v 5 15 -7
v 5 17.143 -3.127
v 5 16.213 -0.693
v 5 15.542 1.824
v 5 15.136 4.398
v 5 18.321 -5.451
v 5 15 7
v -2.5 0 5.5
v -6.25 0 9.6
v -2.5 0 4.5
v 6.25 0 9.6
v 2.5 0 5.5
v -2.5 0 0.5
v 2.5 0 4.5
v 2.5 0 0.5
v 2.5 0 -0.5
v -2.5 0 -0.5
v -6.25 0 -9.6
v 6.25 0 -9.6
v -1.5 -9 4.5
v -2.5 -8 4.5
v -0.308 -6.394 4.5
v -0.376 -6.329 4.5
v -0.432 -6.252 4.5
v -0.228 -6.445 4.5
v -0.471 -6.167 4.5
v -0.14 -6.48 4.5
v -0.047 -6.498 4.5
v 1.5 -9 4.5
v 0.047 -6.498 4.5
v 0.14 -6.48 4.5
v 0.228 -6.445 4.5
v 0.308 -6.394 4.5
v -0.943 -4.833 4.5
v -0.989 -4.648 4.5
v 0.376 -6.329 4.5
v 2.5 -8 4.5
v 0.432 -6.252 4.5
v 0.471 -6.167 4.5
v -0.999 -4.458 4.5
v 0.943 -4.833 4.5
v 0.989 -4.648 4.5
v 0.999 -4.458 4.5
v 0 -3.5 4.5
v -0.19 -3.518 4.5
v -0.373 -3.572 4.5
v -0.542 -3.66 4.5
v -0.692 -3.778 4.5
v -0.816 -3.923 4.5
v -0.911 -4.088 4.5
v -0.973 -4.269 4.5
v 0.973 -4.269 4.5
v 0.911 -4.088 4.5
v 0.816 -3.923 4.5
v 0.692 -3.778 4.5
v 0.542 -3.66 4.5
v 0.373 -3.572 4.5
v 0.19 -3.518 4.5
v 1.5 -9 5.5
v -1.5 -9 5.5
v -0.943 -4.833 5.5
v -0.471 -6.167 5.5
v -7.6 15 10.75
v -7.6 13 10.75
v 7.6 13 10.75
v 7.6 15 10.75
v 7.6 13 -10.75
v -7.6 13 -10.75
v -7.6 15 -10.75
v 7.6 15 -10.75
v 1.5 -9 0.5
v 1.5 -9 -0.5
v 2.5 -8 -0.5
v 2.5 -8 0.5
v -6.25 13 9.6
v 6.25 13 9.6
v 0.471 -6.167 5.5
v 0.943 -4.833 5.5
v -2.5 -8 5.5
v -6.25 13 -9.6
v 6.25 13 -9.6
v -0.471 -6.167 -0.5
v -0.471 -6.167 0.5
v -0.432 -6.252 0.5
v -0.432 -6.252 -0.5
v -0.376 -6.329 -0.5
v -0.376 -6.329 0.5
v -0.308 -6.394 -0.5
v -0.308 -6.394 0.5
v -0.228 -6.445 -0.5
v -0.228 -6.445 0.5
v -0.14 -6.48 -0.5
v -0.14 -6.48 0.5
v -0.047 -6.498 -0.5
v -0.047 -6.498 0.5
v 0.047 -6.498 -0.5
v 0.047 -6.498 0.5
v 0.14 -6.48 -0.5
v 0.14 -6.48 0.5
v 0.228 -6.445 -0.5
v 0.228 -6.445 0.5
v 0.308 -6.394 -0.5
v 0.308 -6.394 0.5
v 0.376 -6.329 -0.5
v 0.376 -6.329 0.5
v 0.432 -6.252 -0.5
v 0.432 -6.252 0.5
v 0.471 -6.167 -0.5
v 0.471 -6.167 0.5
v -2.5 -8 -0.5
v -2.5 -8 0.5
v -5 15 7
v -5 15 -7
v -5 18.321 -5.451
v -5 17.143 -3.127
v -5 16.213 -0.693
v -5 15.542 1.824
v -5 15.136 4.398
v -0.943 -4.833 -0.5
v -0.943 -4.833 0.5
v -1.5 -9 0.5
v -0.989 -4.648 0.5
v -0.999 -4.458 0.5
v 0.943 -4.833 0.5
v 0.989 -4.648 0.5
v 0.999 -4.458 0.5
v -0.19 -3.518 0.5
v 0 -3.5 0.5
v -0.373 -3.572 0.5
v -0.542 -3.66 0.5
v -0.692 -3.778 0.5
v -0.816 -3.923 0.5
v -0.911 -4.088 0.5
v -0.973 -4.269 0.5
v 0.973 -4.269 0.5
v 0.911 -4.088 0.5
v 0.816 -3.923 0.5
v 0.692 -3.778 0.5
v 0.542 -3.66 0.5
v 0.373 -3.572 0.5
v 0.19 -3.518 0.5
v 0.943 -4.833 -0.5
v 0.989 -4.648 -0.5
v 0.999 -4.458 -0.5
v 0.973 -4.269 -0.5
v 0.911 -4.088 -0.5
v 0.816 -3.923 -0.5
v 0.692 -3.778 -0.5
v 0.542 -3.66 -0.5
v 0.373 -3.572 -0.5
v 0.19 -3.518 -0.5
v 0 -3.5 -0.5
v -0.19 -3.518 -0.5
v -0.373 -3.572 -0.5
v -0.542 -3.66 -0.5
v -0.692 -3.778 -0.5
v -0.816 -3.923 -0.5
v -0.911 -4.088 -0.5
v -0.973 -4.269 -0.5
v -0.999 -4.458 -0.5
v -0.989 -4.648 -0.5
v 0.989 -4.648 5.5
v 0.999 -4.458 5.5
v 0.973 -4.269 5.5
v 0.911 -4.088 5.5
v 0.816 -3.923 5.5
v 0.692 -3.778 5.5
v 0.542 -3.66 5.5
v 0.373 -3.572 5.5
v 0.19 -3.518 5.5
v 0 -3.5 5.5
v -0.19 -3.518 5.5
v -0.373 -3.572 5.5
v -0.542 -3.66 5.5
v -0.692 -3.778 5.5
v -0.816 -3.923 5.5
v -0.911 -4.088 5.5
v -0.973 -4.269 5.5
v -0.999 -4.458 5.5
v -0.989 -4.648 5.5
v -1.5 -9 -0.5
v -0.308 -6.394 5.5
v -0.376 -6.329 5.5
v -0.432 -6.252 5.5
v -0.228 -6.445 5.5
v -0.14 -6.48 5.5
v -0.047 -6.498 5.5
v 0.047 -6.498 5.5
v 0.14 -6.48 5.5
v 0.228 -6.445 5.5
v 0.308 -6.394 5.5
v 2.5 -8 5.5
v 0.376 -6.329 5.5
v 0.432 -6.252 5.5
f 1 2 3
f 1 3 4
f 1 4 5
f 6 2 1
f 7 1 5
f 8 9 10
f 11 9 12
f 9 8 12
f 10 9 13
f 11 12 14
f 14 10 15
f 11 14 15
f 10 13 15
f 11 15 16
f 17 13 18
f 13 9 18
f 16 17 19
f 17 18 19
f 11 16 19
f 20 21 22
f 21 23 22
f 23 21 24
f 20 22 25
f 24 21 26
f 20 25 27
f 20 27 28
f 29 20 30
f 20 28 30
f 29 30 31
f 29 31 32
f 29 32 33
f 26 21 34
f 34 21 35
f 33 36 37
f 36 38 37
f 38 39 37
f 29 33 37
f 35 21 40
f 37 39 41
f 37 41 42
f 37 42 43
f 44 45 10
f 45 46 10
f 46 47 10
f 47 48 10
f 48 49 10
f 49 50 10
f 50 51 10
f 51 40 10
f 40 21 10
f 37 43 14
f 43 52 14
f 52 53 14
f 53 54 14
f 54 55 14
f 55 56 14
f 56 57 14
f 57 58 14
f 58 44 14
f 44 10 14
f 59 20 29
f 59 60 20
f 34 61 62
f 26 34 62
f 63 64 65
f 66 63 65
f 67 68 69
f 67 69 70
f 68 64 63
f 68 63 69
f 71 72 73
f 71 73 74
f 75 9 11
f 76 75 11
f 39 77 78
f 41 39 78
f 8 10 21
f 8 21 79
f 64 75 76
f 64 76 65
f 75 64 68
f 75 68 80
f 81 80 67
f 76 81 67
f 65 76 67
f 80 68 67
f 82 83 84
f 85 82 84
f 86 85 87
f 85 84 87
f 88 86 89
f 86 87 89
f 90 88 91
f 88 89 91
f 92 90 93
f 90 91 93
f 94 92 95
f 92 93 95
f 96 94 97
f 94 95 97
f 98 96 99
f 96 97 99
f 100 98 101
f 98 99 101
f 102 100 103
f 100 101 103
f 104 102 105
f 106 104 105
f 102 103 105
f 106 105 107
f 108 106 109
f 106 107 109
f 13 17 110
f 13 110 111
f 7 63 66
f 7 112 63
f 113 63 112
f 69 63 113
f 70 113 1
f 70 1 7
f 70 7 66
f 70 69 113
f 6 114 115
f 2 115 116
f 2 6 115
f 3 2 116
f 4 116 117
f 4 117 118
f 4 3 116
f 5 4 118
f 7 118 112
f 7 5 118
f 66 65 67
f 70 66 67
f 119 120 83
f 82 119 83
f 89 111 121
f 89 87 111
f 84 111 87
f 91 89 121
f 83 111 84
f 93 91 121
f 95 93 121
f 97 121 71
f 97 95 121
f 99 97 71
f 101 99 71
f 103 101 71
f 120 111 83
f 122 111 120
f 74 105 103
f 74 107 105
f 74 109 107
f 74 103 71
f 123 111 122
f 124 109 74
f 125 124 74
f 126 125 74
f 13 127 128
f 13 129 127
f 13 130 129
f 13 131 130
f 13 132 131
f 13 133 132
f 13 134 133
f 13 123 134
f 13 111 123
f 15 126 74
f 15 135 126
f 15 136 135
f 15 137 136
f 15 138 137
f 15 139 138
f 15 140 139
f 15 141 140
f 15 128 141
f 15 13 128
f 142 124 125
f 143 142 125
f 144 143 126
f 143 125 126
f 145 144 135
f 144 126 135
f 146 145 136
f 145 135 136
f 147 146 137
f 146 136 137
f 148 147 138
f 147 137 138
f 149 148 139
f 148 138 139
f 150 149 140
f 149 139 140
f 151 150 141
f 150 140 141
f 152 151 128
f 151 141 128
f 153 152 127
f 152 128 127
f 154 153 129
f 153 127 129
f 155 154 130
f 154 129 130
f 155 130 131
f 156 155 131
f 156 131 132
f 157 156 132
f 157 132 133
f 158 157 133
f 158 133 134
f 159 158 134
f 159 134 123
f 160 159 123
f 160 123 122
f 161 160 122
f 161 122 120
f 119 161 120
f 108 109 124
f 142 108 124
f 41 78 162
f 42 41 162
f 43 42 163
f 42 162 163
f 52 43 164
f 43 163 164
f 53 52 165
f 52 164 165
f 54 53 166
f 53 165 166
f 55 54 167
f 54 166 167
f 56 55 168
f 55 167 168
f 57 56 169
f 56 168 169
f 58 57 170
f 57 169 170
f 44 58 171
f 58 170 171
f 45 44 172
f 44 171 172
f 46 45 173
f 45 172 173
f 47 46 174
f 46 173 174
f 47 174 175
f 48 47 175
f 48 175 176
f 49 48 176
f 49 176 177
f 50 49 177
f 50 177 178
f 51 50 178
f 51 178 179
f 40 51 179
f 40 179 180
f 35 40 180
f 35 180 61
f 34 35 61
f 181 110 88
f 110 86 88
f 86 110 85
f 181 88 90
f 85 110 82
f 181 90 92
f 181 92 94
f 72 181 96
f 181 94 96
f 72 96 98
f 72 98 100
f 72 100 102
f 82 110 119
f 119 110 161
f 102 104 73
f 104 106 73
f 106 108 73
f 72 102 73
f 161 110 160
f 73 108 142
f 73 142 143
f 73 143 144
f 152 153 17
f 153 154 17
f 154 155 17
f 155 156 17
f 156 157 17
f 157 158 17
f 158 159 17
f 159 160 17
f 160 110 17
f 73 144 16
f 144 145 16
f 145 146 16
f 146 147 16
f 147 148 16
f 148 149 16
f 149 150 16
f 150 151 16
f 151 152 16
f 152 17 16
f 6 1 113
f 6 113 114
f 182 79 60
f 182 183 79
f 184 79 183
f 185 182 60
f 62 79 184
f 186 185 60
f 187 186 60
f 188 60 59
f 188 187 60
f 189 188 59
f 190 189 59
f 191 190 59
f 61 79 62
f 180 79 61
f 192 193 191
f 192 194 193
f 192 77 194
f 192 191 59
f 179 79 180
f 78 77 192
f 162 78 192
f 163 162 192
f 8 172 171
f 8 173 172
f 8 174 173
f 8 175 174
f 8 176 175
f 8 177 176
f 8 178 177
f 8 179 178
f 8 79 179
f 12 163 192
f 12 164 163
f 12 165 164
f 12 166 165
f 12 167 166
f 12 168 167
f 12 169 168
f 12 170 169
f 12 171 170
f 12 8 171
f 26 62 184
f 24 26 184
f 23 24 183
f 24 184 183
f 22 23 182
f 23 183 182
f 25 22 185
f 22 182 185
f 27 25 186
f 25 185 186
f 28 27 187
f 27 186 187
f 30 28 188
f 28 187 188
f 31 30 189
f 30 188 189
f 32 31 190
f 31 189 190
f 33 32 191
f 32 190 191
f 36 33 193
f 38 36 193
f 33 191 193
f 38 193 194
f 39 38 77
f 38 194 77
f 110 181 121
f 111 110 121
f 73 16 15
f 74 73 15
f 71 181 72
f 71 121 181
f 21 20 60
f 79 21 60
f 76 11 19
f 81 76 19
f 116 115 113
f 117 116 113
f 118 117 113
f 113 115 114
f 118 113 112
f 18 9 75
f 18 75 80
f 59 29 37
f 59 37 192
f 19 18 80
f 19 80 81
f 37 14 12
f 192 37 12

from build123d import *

# Parameters (mm, degrees)
SKETCH_1_W               = 12.5
SKETCH_1_H               = 19.2
EXTRUDE_1_DEPTH          = 13
SKETCH_2_W               = 5
SKETCH_2_H               = 1
EXTRUDE_2_DEPTH          = 9
CHAMFER_1_SIZE           = 1
CUT_EXTRUDE_1_DEPTH      = 18.608875603
CUT_EXTRUDE_1_DEPTH_BACK = 18.608875603
SKETCH_4_W               = 15.2
SKETCH_4_H               = 21.5
EXTRUDE_3_DEPTH          = 2
EXTRUDE_4_DEPTH          = 5


with BuildPart() as part:
    # Эскиз1 → Бобышка-Вытянуть1 (new body)
    with BuildSketch(Plane(origin=(0, 0, 0), x_dir=(1, 0, 0), z_dir=(0, 1, 0))):
        Rectangle(SKETCH_1_W, SKETCH_1_H)
    extrude(amount=EXTRUDE_1_DEPTH)

    # Эскиз2 → Бобышка-Вытянуть2 (add)
    with BuildSketch(Plane.XZ):
        Rectangle(SKETCH_2_W, SKETCH_2_H)
        with Locations((0, 5)):
            Rectangle(SKETCH_2_W, SKETCH_2_H)
    extrude(amount=EXTRUDE_2_DEPTH)

    # Фаска1
    chamfer_1_edges = [part.edges().sort_by_distance(p)[0] for p in [
        (2.5, -9, 5),
        (-2.5, -9, 5),
        (2.5, -9, 0),
        (-2.5, -9, 0),
    ]]
    chamfer(chamfer_1_edges, length=CHAMFER_1_SIZE)

    # Эскиз3 → Вырез-Вытянуть1 (cut, two sides: drawn at the far end of the back side and taken through both)
    with BuildSketch(Plane(origin=(0, 0, -0.5), x_dir=(-1, 0, 0), z_dir=(0, 0, -1)).offset(-CUT_EXTRUDE_1_DEPTH_BACK)):
        with BuildLine():
            Line((0.942809042, -4.833333333), (0.471404521, -6.166666667))
            ThreePointArc((0.471404521, -6.166666667), (0, -6.5), (-0.471404521, -6.166666667))
            Line((-0.471404521, -6.166666667), (-0.942809042, -4.833333333))
            ThreePointArc((-0.942809042, -4.833333333), (0, -3.5), (0.942809042, -4.833333333))
        make_face()
    extrude(amount=CUT_EXTRUDE_1_DEPTH + CUT_EXTRUDE_1_DEPTH_BACK, mode=Mode.SUBTRACT)

    # Эскиз4 → Бобышка-Вытянуть3 (add)
    with BuildSketch(Plane(origin=(0, 13, 0), x_dir=(1, 0, 0), z_dir=(0, 1, 0))):
        Rectangle(SKETCH_4_W, SKETCH_4_H)
    extrude(amount=EXTRUDE_3_DEPTH)

    # Эскиз5 → Бобышка-Вытянуть4 (add, symmetric)
    with BuildSketch(Plane(origin=(0, 0, 0), x_dir=(0, 0, -1), z_dir=(1, 0, 0))):
        with BuildLine():
            Line((-7, 15), (7, 15))
            Line((7, 15), (5.451254755, 18.321294895))
            ThreePointArc((5.451254755, 18.321294895), (-0.556694467, 15.844590382), (-7, 15))
        make_face()
    extrude(amount=EXTRUDE_4_DEPTH, both=True)


solid = part.part
